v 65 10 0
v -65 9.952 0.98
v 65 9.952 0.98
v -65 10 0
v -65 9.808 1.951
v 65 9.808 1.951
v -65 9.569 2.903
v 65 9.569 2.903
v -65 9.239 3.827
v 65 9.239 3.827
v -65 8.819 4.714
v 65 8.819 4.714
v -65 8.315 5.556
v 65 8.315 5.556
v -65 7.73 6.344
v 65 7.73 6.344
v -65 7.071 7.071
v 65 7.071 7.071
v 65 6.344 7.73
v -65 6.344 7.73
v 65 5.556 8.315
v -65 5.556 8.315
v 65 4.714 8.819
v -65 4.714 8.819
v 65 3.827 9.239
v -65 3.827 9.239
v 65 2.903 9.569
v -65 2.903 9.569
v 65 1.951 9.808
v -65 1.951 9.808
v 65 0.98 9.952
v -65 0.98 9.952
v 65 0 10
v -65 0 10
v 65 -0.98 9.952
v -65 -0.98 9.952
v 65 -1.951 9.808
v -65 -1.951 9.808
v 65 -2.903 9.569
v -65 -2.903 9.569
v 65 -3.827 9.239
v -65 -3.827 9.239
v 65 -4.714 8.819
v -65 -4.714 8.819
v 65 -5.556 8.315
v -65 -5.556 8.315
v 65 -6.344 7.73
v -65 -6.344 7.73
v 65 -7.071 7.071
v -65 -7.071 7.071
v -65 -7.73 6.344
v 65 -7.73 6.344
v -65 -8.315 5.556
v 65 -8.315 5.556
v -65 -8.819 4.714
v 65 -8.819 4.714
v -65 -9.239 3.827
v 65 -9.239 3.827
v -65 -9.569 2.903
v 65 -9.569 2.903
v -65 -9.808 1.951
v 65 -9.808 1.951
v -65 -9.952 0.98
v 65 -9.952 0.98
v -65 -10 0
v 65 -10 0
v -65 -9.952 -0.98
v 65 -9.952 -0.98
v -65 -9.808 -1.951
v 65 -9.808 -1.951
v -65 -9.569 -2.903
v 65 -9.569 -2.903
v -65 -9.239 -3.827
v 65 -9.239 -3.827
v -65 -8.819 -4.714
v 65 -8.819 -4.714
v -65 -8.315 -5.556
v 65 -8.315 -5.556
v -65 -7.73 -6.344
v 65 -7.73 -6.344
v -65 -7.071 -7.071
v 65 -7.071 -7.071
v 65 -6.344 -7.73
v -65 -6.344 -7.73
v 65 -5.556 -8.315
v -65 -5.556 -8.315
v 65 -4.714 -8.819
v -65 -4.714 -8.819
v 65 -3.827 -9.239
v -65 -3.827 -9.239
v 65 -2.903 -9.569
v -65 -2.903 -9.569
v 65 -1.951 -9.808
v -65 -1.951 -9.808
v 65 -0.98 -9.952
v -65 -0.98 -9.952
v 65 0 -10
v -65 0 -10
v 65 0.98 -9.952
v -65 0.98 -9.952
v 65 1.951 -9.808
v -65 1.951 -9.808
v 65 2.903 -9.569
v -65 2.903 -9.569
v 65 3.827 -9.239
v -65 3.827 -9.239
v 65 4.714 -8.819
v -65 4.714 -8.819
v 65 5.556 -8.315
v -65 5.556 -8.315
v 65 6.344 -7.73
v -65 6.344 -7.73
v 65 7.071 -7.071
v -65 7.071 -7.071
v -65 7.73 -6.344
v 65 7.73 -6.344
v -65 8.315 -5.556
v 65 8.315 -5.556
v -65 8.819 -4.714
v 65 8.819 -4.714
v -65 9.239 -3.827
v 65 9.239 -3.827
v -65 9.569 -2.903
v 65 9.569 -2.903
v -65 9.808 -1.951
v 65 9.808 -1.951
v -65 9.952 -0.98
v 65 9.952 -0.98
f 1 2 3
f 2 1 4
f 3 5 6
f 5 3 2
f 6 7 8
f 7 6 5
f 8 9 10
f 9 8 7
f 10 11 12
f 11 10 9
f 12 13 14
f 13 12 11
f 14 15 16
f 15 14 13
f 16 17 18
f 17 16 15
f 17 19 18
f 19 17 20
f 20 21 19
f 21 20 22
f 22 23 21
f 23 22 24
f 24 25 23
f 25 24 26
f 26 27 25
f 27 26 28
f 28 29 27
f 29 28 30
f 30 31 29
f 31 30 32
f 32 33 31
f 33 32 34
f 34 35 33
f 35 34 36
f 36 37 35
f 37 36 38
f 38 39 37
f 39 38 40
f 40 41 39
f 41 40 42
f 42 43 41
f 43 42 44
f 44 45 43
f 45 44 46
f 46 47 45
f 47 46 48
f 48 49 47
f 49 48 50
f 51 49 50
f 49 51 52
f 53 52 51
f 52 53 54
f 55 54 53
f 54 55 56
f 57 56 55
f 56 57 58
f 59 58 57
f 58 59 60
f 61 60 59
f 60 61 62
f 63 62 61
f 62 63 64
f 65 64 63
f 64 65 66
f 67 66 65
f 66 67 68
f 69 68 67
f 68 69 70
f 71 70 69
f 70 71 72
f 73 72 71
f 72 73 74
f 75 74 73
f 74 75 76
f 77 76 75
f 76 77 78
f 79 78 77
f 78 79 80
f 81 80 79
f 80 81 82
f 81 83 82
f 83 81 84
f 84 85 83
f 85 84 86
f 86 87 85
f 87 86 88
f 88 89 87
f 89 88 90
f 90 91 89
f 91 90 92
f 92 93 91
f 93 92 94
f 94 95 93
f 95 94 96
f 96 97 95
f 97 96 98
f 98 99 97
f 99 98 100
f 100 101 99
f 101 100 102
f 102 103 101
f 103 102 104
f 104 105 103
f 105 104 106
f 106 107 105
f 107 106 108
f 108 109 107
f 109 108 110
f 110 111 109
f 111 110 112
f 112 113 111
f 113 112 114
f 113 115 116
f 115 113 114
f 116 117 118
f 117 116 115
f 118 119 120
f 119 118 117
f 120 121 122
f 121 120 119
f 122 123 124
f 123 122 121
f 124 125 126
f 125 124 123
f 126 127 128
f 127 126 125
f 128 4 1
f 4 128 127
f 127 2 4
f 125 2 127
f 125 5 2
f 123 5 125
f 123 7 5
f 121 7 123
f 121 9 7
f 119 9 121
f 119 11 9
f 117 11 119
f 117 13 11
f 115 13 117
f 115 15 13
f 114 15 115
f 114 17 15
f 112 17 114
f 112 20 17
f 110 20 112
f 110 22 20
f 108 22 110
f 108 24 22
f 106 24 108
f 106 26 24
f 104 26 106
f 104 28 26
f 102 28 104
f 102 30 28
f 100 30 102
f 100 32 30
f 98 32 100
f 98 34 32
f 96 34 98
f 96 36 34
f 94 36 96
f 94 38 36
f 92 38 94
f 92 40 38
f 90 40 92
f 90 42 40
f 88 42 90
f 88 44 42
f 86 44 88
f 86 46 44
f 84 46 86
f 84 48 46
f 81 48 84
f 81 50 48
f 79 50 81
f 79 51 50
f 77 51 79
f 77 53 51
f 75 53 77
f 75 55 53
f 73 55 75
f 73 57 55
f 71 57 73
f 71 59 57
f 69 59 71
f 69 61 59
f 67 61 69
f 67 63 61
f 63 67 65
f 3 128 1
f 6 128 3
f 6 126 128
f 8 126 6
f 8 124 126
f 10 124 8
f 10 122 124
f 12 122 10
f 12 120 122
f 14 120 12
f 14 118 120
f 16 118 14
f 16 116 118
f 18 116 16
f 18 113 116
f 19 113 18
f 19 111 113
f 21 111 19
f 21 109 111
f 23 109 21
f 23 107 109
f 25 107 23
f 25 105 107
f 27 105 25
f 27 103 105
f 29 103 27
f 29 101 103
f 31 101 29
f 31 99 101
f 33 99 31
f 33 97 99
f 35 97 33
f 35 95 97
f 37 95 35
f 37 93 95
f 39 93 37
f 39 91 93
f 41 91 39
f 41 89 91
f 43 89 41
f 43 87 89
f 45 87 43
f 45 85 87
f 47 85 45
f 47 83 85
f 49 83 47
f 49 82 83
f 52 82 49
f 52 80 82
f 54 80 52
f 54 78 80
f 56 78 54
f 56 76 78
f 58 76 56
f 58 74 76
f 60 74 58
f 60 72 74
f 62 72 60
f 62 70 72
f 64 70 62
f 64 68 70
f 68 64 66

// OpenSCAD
// file: ../config/parameters.scad
// Global Chassis Dimensions
chassis_width = 720; //kies een veelvoud van 80  
chassis_length = 1040; //kies een veelvoud van 80

// --- Modulair Gatenpatroon (Grid) ---
grid_step = 40; // Universele stapgrootte voor alle gaten

// --- Bereiken (Ranges) voor de Robot Afmetingen ---
// Bereik voor de BREEDTE 
chassis_width_min = 560;
chassis_width_max = 800;
chassis_width_step = 80; // Stapgrootte voor instelbare breedte

// Bereik voor de LENGTE 
chassis_length_min = 720;
chassis_length_max = 1040;
chassis_length_step = 80; // Stapgrootte voor instelbare lengte

// Bereik voor de BASE PLATE 
base_length_min = 800;
base_length_max = 1280;
base_length_step = 80;

// Beam Profile (Purchased Part)
beam_profile = 40;
beam_thickness = 3;    
beam_length_1 = 1000;
beam_length_2 = 1280;

// Upright & Cover
base_plate_length = 1300;
connect_plate_thick = 5; 
upright_height = 500;
top_side_width = 60;
cover_thick = 5;
cover_clearance = 10;  
cover_overlap = 10;
cover_total_height = 530; 
hole_distance_cover = 30;

// Resolution & Preview
$fn = 60; 
exploded_view = false; 
explosion_dist = 800; 

// Motor & Wheel Data
tire_dia = 430;
tire_width = 100;
hub_dia = 160;
hub_width = 140; //specs from Quinder are: Fork width for mounting: 138mm
axle_dia = 10.2; //specs from Quinder are: Mounting hole: max 10.2mm
bolt_dia = 14.2;

// Bracket Geometry universal
bracket_thick = 5;
bracket_bolt_diameter = 10.4; //dikte van de gaten van gaten van de wiel_bracket     
tire_clearance = 130;      
side_plate_top_width = 240;
side_plate_width = 240;

//Side plate
axle_bottom_dist = 35;
extra_space_bracket = 40;
side_hole_start_from_bottom = 20; 
side_hole_pitch = 100; 

tab_length = 40;         // Lengte van de nok/sleuf
tab_offset_y = 40;       // Positie vanaf het midden over de Y-as (uit elkaar)
laser_tolerance = 0.5;   // Extra snijspeling zodat het makkelijk in elkaar schuift

//top plate
bracket_top_hole_dist_x = 80; // De totale gewenste afstand over de X-as
bracket_top_hole_dist_y = 120; // De totale gewenste afstand over de Y-as


arm_height = (tire_dia / 2) + tire_clearance;
inner_width = hub_width;
bracket_total_width = inner_width + (extra_space_bracket*2) + (2 * bracket_thick);
bracket_top_z = arm_height + bracket_thick;

// Axle bracket
axle_hex_width = 85;          
axle_hex_height = 40;
axle_hex_straight_part = 30;   
axle_bracket_thickness = 5;    

axle_hole_diameter = 10.3; //Dikte van het gaten in de axle_bracket
axle_hole_distance = 30; //hoogte vanaf de onderkant tot de wiel ophanging

axle_flat_width = axle_dia; // Gebruikt 10.2 uit parameters 
axle_round_dia = bolt_dia;  // Gebruikt 14.2 uit parameters

// --- Caster Wheel Parameters ---  
bracket_width            = 80;  
bracket_thickness        = 5;
caster_wheel_axle_width  = 130;   
caster_wheel_axle_diameter = 20;
bracket_axle_hole_diameter = 10.4;

pivot_cylinder_dia       = 30;  
pivot_cylinder_height    = 100;  

outer_cylinder_thickness = 5;   
outer_cylinder_height    = 60;  
outer_cylinder_z_offset  = 33;   
kap_speling              = 1;   

tube_width               = 35;  
tube_thickness           = 2;   
tube_length              = 400;
tube_length_min          = 240;
// main file
include <../config/parameters.scad>

module caster_wheel_axle() {
    color("silver") {
        rotate([90, 0, 90]) {
            cylinder(
                h = caster_wheel_axle_width, 
                d = caster_wheel_axle_diameter, 
                center = true, 
                $fn = 64 // Zorgt voor een mooie, gladde ronde cilinder
            );
        }
    }
}

caster_wheel_axle();
